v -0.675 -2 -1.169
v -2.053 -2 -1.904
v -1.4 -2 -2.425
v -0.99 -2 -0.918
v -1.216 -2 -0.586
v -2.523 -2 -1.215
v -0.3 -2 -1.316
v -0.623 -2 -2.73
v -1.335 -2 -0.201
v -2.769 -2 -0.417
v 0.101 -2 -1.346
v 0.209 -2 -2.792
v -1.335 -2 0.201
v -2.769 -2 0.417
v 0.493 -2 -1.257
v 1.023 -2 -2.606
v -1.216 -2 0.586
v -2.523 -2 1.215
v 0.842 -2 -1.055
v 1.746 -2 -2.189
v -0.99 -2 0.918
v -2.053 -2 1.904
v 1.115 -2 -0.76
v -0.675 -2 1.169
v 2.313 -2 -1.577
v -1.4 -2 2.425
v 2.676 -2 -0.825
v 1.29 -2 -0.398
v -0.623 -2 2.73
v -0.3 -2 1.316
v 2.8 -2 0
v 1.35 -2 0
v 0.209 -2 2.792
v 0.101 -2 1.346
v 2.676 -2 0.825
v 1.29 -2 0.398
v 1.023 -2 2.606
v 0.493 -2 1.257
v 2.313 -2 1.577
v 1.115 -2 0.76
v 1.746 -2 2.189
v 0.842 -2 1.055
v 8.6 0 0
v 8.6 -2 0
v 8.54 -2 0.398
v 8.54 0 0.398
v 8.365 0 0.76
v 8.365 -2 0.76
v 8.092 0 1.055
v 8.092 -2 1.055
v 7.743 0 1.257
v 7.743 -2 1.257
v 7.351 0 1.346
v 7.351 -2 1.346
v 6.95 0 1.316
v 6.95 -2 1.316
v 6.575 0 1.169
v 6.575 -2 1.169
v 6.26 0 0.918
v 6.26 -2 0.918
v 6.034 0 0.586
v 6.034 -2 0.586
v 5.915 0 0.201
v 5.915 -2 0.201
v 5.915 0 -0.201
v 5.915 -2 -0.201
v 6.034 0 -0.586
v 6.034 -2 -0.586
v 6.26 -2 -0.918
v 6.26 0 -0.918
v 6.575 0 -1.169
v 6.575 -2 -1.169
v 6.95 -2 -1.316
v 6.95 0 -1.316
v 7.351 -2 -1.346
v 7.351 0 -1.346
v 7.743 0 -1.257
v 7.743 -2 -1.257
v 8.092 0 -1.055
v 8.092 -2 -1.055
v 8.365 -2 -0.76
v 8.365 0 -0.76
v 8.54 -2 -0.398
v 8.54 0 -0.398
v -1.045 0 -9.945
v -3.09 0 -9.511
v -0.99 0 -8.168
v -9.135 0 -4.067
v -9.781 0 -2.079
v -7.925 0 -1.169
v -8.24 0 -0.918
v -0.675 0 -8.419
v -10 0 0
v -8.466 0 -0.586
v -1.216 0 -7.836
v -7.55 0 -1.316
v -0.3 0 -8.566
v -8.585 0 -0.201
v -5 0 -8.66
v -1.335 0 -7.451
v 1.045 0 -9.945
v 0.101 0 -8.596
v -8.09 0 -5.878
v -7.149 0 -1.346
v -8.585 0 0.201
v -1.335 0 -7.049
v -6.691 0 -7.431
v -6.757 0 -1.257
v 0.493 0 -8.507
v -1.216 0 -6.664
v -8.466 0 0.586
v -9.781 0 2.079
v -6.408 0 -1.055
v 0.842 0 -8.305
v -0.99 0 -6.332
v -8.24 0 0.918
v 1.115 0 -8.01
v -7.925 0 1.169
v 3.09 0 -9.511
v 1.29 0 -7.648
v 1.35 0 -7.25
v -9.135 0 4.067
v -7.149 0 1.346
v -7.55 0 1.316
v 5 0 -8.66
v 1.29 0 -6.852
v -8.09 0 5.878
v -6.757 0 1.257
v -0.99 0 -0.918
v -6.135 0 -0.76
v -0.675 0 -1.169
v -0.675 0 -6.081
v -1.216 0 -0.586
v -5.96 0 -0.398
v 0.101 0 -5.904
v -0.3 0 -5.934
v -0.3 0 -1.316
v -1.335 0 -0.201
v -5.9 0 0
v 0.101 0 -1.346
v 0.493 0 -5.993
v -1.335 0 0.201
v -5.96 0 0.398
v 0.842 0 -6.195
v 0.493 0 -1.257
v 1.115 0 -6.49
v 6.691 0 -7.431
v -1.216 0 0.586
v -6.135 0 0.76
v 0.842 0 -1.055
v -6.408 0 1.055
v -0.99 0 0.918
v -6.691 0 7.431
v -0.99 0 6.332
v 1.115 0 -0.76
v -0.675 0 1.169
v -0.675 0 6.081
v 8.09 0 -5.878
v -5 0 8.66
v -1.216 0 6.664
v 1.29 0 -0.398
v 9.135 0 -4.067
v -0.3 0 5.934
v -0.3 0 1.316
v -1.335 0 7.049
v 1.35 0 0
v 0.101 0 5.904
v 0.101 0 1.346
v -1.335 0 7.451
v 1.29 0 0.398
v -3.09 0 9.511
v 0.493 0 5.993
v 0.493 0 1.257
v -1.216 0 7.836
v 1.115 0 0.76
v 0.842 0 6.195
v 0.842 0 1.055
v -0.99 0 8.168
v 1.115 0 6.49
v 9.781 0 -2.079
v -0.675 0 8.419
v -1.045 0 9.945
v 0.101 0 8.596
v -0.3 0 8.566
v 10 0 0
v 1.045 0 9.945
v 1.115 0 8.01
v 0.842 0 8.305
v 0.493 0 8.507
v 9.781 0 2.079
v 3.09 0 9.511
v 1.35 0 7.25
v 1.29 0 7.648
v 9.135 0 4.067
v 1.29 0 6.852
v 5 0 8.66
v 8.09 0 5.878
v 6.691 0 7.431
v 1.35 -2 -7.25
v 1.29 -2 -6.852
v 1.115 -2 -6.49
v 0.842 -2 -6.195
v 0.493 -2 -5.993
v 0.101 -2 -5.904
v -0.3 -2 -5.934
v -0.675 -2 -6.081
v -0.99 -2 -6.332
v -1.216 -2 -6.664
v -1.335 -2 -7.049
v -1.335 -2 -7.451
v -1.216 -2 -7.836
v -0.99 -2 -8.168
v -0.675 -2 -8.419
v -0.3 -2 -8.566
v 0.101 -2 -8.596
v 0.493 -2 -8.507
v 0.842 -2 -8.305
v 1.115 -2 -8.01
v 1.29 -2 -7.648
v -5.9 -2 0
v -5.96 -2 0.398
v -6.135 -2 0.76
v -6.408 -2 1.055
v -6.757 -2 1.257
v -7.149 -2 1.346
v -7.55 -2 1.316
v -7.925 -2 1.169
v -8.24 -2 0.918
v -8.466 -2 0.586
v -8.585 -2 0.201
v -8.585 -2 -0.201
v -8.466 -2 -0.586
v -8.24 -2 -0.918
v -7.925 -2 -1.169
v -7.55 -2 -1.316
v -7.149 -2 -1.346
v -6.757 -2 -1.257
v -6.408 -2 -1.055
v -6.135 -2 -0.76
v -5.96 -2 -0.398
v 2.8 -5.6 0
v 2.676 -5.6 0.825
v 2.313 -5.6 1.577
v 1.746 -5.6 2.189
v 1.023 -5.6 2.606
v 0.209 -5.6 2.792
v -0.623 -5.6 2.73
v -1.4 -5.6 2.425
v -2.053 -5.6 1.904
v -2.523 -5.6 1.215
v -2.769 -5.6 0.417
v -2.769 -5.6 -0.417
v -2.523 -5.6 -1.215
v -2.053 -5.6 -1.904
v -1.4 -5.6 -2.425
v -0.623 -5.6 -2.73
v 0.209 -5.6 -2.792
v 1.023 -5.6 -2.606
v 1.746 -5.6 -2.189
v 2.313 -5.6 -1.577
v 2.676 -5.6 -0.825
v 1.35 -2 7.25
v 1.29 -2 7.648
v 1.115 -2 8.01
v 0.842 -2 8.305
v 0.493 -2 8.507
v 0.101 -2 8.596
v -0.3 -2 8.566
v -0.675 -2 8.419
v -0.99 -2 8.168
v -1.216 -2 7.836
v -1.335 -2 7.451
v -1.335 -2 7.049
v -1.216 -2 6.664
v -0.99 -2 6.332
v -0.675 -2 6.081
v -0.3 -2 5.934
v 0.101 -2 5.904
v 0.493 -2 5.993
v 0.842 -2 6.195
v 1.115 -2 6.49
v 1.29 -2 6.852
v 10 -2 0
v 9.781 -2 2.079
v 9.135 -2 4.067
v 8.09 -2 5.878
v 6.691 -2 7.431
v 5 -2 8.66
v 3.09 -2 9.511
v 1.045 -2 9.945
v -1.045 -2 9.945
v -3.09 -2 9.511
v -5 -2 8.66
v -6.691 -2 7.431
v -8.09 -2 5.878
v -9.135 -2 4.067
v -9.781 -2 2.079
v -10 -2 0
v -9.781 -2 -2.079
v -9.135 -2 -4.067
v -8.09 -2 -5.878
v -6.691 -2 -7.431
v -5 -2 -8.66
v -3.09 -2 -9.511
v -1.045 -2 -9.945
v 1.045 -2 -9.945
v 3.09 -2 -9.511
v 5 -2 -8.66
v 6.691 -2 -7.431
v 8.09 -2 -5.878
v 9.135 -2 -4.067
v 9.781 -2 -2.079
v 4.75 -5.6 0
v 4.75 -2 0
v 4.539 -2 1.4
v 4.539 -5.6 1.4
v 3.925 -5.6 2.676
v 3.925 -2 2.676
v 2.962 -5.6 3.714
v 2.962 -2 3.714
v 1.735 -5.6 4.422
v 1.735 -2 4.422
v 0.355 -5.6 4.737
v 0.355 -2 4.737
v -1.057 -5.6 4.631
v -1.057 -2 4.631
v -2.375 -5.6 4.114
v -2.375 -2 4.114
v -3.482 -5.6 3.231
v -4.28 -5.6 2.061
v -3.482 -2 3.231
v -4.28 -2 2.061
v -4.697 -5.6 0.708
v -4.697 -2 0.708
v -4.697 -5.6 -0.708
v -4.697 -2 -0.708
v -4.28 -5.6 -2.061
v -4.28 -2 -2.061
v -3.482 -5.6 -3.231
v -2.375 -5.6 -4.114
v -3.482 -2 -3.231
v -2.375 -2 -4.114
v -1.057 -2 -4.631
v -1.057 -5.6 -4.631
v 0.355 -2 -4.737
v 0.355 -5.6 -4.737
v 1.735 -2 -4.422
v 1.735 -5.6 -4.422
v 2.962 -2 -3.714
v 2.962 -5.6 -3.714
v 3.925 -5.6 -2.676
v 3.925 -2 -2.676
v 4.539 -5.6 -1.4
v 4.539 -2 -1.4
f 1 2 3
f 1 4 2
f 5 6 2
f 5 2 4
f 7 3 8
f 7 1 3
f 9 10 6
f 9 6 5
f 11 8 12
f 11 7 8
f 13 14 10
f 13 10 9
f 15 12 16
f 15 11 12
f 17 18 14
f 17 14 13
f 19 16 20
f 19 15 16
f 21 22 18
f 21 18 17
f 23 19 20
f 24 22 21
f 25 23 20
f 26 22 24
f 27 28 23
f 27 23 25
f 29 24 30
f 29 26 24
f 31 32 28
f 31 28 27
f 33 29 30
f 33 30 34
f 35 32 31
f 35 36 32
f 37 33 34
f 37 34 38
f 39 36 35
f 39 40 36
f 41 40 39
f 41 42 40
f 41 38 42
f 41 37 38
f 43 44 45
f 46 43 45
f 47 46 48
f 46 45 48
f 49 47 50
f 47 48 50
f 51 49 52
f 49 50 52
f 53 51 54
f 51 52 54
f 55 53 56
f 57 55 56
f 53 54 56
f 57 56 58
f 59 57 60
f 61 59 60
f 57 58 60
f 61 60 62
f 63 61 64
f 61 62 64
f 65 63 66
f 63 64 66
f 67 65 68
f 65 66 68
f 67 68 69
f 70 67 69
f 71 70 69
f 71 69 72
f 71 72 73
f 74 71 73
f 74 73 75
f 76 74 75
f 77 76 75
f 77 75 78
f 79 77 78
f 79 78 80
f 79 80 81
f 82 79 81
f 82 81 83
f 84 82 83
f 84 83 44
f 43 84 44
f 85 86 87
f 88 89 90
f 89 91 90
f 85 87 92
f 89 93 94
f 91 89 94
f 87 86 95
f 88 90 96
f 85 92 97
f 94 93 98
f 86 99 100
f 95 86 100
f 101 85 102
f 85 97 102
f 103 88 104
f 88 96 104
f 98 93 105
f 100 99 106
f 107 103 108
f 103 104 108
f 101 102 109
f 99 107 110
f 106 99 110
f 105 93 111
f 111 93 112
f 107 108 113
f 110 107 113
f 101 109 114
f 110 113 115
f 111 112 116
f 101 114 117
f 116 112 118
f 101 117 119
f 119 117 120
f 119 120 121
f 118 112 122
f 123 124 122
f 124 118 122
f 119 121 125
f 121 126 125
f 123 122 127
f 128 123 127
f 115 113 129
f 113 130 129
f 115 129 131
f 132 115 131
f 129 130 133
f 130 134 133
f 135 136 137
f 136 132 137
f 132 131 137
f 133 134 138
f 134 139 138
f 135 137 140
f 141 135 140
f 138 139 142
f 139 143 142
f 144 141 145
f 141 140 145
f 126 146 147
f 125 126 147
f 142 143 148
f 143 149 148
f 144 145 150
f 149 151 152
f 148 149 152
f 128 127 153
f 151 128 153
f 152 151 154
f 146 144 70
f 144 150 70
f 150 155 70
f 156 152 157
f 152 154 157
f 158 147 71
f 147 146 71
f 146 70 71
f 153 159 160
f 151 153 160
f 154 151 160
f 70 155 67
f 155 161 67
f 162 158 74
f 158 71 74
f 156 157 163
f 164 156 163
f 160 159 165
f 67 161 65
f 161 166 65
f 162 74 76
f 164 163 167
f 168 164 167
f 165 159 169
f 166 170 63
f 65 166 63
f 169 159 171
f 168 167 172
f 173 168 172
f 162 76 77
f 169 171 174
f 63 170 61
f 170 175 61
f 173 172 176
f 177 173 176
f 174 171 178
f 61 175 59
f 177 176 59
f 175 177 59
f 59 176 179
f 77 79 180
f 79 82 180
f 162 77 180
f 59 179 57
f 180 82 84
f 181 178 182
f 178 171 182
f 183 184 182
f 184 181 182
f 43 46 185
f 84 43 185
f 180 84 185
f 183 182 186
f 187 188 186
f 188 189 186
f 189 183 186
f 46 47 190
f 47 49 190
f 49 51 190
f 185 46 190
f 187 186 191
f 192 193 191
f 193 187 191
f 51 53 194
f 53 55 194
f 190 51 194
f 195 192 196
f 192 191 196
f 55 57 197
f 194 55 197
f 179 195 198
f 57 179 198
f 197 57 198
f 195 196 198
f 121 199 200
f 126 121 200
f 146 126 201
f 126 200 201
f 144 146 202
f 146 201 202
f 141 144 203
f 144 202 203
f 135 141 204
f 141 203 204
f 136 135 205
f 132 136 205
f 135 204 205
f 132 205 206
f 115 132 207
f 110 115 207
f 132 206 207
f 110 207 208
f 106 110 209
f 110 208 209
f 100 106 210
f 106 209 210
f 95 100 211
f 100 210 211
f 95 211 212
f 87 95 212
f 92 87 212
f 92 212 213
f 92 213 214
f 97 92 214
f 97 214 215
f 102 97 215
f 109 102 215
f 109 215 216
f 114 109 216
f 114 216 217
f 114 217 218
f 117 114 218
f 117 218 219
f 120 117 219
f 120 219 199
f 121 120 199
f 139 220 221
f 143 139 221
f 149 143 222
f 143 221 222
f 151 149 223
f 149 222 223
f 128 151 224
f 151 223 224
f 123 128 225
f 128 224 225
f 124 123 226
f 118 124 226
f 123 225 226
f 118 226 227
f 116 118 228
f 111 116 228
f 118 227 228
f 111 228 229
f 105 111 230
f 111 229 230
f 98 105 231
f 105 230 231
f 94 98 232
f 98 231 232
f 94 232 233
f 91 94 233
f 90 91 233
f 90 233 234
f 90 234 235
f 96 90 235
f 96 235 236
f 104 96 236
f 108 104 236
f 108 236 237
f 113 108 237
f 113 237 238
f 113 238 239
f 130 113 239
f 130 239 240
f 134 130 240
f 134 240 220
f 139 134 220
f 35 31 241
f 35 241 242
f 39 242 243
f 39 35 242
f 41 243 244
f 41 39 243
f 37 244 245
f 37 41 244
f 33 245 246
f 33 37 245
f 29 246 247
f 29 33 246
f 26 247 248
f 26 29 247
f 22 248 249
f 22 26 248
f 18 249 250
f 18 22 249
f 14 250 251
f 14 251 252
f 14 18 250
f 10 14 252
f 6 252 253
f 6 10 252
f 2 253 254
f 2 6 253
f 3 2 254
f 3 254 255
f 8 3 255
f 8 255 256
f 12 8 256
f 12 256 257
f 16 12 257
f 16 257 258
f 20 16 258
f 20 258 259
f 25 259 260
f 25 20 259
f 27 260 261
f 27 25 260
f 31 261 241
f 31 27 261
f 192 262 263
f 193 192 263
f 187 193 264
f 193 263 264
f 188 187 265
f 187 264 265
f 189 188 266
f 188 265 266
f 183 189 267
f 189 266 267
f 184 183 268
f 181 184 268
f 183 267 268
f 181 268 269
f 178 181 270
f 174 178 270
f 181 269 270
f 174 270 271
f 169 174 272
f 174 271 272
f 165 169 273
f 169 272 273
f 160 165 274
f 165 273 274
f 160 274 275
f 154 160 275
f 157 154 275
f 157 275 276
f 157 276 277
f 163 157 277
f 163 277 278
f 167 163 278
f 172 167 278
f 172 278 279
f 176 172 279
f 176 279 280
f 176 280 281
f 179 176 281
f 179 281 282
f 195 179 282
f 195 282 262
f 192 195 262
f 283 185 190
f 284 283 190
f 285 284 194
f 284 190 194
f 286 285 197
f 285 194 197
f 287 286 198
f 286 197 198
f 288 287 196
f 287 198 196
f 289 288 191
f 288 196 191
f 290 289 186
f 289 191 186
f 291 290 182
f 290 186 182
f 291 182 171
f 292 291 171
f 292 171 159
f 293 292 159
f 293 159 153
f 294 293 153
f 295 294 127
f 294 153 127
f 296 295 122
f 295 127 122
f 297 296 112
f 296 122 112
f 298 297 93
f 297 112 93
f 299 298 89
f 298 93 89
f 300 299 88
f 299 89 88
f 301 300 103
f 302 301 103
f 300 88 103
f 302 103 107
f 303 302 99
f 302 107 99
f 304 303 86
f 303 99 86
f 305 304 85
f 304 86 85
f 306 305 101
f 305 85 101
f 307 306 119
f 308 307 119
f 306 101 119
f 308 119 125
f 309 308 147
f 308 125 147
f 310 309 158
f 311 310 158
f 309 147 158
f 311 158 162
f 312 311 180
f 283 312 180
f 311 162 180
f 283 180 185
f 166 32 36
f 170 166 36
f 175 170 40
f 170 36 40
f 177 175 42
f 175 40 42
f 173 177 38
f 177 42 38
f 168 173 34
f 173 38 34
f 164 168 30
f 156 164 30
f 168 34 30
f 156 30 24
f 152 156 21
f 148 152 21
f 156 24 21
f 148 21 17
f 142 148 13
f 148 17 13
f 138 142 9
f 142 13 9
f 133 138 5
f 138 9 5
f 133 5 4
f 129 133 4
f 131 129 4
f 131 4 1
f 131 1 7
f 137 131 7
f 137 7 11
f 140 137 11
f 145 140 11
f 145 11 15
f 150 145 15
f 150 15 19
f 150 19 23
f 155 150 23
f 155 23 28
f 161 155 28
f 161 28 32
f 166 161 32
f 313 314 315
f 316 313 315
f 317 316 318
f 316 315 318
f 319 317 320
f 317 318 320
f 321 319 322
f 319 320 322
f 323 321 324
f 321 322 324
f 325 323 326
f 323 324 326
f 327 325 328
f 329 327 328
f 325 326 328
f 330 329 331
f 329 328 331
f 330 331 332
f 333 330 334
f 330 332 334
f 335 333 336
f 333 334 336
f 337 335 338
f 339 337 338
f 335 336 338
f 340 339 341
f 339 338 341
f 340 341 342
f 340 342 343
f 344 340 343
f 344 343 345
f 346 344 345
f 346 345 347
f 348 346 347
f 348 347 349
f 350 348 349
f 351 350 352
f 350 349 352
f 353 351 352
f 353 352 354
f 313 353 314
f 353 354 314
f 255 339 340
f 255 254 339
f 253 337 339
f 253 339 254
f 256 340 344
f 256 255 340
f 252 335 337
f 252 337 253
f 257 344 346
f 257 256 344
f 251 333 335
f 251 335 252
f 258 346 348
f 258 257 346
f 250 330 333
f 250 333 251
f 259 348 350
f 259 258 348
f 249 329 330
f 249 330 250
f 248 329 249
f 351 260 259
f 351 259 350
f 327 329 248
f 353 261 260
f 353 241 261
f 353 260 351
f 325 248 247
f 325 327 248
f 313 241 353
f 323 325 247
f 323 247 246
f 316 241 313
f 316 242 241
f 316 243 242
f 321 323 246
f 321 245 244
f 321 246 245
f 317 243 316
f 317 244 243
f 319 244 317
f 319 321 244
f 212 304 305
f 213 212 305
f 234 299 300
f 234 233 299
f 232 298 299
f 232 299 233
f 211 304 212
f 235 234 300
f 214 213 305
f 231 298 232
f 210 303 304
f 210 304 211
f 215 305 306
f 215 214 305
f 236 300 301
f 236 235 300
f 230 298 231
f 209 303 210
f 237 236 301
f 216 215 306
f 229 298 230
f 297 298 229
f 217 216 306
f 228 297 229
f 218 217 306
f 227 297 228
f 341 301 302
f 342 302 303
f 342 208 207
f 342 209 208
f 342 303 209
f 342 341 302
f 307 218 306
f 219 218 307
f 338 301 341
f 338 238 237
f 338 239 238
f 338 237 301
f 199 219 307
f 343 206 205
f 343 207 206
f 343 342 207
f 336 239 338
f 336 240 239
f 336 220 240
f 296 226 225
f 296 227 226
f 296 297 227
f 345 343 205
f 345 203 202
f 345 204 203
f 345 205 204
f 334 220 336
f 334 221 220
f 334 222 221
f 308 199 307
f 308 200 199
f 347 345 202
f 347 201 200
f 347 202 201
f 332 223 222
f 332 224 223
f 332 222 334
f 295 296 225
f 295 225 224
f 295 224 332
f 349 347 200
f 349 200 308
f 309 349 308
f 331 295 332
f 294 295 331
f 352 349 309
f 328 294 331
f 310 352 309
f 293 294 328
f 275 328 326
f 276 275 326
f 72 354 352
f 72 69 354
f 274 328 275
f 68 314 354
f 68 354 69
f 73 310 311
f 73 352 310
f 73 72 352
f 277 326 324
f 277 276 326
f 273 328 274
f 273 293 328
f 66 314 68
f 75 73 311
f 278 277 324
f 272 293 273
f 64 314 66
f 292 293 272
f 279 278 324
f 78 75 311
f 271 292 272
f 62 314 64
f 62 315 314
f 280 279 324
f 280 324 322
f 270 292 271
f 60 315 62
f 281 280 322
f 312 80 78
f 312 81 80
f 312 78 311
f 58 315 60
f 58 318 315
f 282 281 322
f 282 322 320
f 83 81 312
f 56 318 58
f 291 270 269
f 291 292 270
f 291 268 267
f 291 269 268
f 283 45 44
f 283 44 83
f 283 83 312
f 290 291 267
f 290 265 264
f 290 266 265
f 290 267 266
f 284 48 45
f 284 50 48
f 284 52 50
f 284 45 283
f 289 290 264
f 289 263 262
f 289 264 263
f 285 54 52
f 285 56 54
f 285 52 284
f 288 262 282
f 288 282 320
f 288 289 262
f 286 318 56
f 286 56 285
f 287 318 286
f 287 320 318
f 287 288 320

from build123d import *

# Parameters (mm, degrees)
F0_R     = 10
F1_DEPTH = 2
F2_R     = 4.75
F2_R_2   = 2.8
F3_DEPTH = 3.6
F4_R     = 1.35
F5_DEPTH = 25


with BuildPart() as f1:
    # F0 (on Front) → F1 (new body)
    with BuildSketch(Plane.XZ):
        Circle(F0_R)
    extrude(amount=F1_DEPTH)

    # F2 (on face) → F3 (join)
    with BuildSketch(Plane.XZ.offset(2)):
        Circle(F2_R)
        Circle(F2_R_2, mode=Mode.SUBTRACT)
    extrude(amount=F3_DEPTH)

    # F4 (on face) → F5 (cut)
    with BuildSketch(Plane.XZ.offset(2)):
        with Locations((0, 7.25)):
            Circle(F4_R)
        with Locations((-7.25, 0)):
            Circle(F4_R)
        Circle(F4_R)
        with Locations((7.25, 0)):
            Circle(F4_R)
        with Locations((0, -7.25)):
            Circle(F4_R)
    extrude(amount=-F5_DEPTH, mode=Mode.SUBTRACT)


solid = f1.part
